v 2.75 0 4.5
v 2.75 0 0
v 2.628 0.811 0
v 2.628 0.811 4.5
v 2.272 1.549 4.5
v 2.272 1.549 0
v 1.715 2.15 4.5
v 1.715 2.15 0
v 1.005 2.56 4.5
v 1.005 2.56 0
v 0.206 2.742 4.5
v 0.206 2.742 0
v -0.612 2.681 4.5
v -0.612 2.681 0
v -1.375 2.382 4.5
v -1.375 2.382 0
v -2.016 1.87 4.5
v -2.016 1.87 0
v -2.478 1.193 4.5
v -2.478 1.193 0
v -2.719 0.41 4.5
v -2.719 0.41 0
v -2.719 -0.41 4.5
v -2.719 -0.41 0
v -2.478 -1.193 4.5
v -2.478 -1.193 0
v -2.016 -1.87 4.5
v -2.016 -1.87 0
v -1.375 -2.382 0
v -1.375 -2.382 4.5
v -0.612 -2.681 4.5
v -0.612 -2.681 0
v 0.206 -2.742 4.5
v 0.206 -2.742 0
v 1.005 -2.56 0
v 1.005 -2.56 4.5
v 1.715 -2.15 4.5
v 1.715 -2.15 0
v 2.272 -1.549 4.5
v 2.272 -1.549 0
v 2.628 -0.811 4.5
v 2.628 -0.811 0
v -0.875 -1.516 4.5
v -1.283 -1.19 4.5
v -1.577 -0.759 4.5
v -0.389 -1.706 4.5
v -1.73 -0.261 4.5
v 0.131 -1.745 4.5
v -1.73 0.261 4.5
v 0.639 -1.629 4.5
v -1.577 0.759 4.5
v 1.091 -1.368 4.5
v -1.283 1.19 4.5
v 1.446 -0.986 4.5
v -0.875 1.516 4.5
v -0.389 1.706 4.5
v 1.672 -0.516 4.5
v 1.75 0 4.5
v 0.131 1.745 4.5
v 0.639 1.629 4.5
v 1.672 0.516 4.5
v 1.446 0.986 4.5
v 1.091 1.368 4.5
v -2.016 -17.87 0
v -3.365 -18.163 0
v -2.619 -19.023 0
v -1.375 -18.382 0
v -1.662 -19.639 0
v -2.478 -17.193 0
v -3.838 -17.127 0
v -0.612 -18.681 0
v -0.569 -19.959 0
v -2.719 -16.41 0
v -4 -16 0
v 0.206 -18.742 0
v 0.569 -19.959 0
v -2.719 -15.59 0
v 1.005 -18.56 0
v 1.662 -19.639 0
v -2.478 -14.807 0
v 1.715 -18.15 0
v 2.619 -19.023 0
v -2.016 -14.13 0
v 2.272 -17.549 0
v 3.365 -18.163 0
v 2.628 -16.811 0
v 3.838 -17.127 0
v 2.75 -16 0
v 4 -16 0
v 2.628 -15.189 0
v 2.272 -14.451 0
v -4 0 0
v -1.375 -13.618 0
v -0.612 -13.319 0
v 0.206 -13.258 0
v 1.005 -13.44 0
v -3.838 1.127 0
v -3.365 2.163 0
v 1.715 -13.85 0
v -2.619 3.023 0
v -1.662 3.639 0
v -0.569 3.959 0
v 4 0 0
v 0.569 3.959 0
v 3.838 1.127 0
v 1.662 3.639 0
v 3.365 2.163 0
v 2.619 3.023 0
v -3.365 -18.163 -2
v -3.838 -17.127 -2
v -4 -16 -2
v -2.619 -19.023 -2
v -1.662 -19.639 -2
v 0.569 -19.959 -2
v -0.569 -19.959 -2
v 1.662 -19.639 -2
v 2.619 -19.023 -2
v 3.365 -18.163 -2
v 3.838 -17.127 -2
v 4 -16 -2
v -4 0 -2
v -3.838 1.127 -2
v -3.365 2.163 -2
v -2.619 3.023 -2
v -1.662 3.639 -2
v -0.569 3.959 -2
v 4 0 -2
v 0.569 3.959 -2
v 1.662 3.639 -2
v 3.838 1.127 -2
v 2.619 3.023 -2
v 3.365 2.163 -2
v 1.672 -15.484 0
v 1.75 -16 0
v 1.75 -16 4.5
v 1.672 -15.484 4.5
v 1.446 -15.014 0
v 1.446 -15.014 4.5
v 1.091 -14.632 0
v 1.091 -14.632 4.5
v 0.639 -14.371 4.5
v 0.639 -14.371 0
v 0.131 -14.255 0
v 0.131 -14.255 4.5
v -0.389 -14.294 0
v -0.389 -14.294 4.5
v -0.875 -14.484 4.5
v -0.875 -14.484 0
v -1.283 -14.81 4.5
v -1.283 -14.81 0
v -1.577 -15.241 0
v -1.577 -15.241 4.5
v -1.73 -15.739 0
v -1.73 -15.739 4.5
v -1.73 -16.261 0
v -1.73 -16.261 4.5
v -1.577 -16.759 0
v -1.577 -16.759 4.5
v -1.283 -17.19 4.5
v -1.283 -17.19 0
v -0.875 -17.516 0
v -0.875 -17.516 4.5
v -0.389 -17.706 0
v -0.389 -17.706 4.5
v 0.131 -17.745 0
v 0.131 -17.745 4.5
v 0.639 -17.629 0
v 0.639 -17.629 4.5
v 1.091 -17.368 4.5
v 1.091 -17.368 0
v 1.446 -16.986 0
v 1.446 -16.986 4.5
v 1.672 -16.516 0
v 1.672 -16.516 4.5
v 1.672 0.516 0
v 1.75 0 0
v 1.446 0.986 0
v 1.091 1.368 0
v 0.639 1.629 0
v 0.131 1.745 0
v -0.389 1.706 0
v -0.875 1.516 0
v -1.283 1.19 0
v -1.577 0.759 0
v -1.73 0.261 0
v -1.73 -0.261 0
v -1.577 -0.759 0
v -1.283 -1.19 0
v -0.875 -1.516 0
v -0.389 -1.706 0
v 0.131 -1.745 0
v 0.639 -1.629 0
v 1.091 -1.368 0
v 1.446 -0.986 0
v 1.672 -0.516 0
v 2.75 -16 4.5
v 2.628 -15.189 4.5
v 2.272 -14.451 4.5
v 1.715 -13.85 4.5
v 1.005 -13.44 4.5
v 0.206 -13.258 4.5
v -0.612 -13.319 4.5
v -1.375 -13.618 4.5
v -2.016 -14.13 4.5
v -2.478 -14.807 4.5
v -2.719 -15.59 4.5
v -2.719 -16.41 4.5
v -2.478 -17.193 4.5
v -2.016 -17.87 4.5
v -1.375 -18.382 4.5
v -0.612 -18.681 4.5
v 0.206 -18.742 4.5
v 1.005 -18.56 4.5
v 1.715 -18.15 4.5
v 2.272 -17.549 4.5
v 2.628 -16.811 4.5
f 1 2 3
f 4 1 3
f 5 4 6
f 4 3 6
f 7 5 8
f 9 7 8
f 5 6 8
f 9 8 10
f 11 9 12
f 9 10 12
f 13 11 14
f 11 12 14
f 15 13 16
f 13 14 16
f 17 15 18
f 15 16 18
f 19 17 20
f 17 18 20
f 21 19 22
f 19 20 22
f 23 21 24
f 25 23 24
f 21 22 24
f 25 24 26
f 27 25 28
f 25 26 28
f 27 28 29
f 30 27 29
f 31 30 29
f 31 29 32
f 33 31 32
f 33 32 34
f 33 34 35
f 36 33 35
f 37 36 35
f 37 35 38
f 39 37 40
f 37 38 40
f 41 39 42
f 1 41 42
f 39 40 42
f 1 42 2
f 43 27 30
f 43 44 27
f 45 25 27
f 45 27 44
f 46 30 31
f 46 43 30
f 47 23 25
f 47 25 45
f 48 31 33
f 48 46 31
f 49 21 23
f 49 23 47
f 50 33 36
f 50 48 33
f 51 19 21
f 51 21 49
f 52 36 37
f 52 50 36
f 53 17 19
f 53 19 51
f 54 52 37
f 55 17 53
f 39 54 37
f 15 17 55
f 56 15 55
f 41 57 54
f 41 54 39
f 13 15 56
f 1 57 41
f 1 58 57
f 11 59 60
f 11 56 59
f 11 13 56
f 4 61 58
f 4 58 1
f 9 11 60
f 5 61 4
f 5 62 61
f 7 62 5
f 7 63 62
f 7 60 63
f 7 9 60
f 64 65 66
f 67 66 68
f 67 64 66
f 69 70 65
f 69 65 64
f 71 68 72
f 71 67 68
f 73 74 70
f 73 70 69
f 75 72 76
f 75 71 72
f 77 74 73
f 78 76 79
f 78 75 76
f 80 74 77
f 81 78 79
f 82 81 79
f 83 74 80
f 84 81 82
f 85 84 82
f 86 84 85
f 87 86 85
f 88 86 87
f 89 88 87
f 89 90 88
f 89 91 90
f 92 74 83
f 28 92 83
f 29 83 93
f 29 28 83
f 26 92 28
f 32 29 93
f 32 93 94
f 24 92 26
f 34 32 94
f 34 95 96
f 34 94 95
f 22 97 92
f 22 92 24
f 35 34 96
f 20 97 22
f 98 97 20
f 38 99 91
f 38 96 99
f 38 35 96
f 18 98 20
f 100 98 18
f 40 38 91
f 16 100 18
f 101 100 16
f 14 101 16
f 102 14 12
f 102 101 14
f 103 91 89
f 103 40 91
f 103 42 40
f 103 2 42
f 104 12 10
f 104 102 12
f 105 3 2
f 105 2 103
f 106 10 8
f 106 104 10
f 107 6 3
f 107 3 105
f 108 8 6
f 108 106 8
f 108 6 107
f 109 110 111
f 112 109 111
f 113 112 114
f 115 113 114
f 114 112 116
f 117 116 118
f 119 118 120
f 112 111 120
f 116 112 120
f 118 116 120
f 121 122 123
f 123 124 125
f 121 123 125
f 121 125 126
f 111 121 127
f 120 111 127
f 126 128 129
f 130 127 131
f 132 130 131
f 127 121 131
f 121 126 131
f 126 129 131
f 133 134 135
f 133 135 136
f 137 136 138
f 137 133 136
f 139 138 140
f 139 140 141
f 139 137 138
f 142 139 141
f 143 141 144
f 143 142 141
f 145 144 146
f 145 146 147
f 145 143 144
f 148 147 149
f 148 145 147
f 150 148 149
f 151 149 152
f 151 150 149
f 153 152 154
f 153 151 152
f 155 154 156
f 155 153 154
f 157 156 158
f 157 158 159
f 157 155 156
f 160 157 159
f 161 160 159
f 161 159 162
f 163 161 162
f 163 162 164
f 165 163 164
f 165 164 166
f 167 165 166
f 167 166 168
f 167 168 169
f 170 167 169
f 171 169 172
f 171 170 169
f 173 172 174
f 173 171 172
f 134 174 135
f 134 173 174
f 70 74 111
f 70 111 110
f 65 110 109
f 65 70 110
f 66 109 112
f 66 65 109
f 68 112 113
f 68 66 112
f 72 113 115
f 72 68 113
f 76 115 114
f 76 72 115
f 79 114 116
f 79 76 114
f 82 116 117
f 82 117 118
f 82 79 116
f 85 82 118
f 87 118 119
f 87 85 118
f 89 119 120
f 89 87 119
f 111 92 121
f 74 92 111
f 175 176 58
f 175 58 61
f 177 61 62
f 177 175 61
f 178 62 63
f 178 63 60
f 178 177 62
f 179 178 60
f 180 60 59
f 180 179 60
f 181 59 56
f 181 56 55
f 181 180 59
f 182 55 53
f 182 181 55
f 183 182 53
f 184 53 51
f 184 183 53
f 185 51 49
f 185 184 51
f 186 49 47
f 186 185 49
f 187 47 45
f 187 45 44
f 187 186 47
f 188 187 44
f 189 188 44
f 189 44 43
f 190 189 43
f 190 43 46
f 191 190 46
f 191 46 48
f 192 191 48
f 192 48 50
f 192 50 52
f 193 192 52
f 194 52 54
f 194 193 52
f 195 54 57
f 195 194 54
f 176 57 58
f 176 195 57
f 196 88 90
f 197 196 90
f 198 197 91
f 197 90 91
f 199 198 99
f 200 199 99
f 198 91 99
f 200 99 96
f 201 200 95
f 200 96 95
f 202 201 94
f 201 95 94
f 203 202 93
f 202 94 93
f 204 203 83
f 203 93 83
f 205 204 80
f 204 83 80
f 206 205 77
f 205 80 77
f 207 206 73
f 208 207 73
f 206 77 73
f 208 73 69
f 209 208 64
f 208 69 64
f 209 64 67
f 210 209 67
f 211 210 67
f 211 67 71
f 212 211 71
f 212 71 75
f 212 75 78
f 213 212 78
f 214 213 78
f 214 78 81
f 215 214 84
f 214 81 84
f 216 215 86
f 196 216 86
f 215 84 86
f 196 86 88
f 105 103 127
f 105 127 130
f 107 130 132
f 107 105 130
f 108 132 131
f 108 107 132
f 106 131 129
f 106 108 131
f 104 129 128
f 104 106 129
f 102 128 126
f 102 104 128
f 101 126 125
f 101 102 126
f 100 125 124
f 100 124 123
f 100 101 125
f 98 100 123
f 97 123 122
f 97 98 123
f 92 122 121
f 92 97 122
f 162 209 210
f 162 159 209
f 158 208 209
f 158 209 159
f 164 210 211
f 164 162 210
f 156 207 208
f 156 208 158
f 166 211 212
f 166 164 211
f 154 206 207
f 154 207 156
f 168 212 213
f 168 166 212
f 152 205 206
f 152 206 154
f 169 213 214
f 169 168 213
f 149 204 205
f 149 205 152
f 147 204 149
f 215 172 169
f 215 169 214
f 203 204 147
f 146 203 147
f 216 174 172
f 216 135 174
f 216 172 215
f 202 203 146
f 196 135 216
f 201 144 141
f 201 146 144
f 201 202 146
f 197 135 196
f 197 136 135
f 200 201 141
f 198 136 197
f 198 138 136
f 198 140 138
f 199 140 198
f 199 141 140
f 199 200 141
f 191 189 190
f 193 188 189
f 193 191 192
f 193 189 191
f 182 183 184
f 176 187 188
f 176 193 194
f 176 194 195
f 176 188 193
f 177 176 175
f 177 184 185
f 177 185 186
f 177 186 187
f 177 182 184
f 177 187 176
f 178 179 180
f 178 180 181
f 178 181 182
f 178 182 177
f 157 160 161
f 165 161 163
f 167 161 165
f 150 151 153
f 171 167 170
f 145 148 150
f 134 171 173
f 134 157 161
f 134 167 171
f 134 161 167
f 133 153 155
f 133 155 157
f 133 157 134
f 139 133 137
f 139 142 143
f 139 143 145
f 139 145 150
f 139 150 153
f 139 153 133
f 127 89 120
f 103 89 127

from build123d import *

# Parameters (mm, degrees)
BOSS_EXTRUDE1_DEPTH = 2
SKETCH1_3_R         = 2.75
SKETCH1_3_R_2       = 1.75
BOSS_EXTRUDE2_DEPTH = 4.5


with BuildPart() as part:
    # Sketch1 → Boss-Extrude1 (new body)
    with BuildSketch(Plane.XY):
        with BuildLine():
            Line((4, -16), (4, 0))
            ThreePointArc((4, 0), (0, 4), (-4, 0))
            Line((-4, 0), (-4, -16))
            ThreePointArc((-4, -16), (0, -20), (4, -16))
        make_face()
    extrude(amount=-BOSS_EXTRUDE1_DEPTH)

    # Sketch1<3> → Boss-Extrude2 (add)
    # profile 1 of 2: a face of its own
    with BuildSketch(Plane.XY):
        Circle(SKETCH1_3_R)
        Circle(SKETCH1_3_R_2, mode=Mode.SUBTRACT)
    # profile 2 of 2: a face of its own
    with BuildSketch(Plane.XY):
        with Locations((0, -16)):
            Circle(SKETCH1_3_R)
        with Locations((0, -16)):
            Circle(SKETCH1_3_R_2, mode=Mode.SUBTRACT)
    extrude(amount=BOSS_EXTRUDE2_DEPTH)


solid = part.part
